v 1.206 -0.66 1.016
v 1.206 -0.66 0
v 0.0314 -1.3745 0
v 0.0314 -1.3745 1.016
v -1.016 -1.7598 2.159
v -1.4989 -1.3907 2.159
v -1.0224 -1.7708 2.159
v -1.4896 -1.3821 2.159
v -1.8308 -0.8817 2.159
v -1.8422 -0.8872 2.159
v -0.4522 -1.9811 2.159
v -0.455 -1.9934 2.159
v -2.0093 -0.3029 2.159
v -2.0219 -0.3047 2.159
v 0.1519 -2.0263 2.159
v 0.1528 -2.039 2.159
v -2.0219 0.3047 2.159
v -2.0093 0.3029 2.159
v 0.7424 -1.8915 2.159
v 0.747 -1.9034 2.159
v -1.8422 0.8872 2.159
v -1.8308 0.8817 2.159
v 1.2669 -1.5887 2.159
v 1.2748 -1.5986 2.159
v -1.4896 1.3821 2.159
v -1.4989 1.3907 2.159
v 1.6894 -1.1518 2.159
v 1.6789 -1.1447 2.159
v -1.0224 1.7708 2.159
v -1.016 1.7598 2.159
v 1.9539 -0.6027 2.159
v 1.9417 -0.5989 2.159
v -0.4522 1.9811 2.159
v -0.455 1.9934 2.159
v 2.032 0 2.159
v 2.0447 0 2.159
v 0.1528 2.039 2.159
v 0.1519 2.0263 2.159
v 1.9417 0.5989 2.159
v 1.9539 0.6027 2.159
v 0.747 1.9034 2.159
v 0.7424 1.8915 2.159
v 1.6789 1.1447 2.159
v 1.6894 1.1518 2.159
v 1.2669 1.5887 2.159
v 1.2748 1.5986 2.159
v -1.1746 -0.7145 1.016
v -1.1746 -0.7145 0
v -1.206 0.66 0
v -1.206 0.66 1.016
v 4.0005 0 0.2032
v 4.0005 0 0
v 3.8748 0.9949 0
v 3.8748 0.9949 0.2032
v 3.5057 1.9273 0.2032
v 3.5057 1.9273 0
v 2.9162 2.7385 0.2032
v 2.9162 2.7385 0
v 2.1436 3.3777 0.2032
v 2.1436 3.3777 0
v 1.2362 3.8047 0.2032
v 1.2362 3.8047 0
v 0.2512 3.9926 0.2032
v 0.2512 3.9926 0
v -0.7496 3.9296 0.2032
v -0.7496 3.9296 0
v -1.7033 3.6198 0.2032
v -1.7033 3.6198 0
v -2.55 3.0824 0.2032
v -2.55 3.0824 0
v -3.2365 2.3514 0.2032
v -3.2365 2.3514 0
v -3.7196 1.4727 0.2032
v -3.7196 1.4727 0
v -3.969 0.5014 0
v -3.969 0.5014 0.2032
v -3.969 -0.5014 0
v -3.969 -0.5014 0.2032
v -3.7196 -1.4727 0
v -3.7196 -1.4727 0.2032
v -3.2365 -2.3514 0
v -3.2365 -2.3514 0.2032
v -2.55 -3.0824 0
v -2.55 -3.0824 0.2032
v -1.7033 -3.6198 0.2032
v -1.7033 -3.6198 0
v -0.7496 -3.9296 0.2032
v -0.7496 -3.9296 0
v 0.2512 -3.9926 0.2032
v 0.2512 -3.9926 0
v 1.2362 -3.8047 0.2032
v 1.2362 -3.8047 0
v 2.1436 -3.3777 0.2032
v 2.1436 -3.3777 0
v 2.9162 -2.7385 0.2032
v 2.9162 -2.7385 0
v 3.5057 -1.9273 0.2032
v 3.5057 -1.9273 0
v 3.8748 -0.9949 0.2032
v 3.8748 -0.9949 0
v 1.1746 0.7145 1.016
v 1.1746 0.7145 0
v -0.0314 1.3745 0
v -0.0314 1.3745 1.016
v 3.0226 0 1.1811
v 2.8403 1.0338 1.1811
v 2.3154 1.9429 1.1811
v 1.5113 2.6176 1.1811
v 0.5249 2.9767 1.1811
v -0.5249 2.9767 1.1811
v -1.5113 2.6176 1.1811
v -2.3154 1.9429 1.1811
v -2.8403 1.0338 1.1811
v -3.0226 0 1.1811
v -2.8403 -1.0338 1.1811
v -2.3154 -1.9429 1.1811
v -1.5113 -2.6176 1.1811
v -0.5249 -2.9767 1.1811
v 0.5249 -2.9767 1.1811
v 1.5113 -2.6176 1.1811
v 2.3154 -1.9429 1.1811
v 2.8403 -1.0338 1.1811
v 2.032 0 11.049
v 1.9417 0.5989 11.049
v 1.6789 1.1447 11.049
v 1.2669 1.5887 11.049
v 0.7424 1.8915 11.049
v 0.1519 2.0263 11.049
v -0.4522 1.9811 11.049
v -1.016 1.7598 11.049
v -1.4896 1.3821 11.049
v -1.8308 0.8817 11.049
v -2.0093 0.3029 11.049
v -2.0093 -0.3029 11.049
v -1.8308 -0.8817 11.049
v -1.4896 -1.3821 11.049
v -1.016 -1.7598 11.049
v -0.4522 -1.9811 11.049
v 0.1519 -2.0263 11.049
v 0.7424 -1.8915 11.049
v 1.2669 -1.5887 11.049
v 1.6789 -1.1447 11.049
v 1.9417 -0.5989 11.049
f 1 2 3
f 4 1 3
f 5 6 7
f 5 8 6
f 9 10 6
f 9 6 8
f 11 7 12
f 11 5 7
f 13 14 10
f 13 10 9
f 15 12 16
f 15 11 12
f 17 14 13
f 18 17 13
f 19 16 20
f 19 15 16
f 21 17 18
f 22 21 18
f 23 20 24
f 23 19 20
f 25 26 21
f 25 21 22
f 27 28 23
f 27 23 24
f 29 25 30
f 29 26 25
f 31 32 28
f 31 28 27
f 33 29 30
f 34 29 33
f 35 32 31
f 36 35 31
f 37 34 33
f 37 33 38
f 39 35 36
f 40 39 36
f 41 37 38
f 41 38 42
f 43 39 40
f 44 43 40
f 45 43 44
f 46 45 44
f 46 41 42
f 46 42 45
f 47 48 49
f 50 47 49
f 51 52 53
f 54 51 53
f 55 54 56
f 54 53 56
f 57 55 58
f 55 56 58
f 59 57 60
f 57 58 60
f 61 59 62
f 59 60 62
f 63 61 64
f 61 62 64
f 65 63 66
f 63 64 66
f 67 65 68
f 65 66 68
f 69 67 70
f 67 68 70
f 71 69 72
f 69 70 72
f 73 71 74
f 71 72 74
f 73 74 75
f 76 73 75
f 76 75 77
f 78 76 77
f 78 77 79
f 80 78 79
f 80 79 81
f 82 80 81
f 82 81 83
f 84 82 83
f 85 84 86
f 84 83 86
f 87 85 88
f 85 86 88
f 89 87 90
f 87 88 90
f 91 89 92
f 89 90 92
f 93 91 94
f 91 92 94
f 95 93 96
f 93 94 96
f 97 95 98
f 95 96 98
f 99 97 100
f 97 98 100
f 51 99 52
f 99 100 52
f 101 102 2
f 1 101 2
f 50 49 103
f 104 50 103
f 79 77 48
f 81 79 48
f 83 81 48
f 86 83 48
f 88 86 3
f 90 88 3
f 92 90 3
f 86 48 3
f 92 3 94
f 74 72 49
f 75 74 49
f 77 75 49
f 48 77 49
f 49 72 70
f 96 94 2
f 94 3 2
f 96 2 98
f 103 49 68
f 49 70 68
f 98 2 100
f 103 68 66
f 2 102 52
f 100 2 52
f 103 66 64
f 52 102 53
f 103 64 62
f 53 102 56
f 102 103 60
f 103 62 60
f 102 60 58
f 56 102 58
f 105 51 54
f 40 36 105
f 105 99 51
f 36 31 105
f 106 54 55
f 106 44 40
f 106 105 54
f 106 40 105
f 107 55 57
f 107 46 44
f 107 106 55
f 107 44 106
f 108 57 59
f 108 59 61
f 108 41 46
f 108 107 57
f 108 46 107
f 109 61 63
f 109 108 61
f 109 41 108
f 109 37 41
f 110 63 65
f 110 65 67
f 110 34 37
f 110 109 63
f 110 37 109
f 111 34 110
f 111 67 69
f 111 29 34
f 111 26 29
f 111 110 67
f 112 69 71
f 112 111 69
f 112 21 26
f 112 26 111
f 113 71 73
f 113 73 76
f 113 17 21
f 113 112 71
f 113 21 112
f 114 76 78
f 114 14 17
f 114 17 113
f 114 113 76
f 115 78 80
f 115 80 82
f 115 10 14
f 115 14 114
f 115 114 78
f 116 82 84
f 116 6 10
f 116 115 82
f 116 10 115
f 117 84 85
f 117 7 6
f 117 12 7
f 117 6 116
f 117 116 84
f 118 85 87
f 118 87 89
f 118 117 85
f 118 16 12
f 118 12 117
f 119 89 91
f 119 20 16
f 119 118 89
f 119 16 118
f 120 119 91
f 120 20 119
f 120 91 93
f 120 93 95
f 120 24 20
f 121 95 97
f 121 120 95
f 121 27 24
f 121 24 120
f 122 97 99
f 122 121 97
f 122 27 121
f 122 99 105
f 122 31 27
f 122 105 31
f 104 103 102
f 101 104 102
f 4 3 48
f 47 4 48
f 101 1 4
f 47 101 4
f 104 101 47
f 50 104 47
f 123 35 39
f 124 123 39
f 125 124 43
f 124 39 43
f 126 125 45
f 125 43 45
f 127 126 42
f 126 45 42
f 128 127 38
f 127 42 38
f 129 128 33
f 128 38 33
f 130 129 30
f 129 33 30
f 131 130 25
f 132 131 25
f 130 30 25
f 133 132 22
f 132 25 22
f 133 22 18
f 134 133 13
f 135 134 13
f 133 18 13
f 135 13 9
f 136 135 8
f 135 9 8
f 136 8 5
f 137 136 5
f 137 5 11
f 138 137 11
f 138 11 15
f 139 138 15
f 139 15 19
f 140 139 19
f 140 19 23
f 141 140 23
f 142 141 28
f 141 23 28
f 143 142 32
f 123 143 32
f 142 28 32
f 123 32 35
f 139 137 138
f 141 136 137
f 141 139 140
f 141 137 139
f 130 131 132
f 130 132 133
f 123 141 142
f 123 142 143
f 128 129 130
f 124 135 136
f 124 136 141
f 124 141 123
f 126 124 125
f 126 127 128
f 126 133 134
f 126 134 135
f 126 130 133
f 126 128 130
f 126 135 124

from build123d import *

# Parameters (mm, degrees)
SKETCH1_R      = 4.0005
EXTRUDE1_DEPTH = 2.159
SKETCH2_R      = 2.032
EXTRUDE2_DEPTH = 8.89
EXTRUDE3_DEPTH = 1.016
CHAMFER1_SIZE  = 1.9558


with BuildPart() as part:
    # Sketch1 → Extrude1 (new body)
    with BuildSketch(Plane.XY):
        Circle(SKETCH1_R)
    extrude(amount=EXTRUDE1_DEPTH)

    # Sketch2 → Extrude2 (add)
    with BuildSketch(Plane.XY.offset(2.159)):
        Circle(SKETCH2_R)
    extrude(amount=EXTRUDE2_DEPTH)

    # Sketch3 → Extrude3 (cut)
    with BuildSketch(Plane(origin=(0, 0, 0), x_dir=(-1, 0, 0), z_dir=(0, 0, -1))):
        Polygon((1.206032038, 0.660002963), (0.031436687, 1.374455864), (-1.174595351, 0.714452901), (-1.206032038, -0.660002963), (-0.031436687, -1.374455864), (1.174595351, -0.714452901), align=None)
    extrude(amount=-EXTRUDE3_DEPTH, mode=Mode.SUBTRACT)

    # Chamfer1
    chamfer1_edges = [part.edges().sort_by_distance(p)[0] for p in [
        (-4.0005, 0, 2.159),
    ]]
    chamfer(chamfer1_edges, length=CHAMFER1_SIZE)


solid = part.part
